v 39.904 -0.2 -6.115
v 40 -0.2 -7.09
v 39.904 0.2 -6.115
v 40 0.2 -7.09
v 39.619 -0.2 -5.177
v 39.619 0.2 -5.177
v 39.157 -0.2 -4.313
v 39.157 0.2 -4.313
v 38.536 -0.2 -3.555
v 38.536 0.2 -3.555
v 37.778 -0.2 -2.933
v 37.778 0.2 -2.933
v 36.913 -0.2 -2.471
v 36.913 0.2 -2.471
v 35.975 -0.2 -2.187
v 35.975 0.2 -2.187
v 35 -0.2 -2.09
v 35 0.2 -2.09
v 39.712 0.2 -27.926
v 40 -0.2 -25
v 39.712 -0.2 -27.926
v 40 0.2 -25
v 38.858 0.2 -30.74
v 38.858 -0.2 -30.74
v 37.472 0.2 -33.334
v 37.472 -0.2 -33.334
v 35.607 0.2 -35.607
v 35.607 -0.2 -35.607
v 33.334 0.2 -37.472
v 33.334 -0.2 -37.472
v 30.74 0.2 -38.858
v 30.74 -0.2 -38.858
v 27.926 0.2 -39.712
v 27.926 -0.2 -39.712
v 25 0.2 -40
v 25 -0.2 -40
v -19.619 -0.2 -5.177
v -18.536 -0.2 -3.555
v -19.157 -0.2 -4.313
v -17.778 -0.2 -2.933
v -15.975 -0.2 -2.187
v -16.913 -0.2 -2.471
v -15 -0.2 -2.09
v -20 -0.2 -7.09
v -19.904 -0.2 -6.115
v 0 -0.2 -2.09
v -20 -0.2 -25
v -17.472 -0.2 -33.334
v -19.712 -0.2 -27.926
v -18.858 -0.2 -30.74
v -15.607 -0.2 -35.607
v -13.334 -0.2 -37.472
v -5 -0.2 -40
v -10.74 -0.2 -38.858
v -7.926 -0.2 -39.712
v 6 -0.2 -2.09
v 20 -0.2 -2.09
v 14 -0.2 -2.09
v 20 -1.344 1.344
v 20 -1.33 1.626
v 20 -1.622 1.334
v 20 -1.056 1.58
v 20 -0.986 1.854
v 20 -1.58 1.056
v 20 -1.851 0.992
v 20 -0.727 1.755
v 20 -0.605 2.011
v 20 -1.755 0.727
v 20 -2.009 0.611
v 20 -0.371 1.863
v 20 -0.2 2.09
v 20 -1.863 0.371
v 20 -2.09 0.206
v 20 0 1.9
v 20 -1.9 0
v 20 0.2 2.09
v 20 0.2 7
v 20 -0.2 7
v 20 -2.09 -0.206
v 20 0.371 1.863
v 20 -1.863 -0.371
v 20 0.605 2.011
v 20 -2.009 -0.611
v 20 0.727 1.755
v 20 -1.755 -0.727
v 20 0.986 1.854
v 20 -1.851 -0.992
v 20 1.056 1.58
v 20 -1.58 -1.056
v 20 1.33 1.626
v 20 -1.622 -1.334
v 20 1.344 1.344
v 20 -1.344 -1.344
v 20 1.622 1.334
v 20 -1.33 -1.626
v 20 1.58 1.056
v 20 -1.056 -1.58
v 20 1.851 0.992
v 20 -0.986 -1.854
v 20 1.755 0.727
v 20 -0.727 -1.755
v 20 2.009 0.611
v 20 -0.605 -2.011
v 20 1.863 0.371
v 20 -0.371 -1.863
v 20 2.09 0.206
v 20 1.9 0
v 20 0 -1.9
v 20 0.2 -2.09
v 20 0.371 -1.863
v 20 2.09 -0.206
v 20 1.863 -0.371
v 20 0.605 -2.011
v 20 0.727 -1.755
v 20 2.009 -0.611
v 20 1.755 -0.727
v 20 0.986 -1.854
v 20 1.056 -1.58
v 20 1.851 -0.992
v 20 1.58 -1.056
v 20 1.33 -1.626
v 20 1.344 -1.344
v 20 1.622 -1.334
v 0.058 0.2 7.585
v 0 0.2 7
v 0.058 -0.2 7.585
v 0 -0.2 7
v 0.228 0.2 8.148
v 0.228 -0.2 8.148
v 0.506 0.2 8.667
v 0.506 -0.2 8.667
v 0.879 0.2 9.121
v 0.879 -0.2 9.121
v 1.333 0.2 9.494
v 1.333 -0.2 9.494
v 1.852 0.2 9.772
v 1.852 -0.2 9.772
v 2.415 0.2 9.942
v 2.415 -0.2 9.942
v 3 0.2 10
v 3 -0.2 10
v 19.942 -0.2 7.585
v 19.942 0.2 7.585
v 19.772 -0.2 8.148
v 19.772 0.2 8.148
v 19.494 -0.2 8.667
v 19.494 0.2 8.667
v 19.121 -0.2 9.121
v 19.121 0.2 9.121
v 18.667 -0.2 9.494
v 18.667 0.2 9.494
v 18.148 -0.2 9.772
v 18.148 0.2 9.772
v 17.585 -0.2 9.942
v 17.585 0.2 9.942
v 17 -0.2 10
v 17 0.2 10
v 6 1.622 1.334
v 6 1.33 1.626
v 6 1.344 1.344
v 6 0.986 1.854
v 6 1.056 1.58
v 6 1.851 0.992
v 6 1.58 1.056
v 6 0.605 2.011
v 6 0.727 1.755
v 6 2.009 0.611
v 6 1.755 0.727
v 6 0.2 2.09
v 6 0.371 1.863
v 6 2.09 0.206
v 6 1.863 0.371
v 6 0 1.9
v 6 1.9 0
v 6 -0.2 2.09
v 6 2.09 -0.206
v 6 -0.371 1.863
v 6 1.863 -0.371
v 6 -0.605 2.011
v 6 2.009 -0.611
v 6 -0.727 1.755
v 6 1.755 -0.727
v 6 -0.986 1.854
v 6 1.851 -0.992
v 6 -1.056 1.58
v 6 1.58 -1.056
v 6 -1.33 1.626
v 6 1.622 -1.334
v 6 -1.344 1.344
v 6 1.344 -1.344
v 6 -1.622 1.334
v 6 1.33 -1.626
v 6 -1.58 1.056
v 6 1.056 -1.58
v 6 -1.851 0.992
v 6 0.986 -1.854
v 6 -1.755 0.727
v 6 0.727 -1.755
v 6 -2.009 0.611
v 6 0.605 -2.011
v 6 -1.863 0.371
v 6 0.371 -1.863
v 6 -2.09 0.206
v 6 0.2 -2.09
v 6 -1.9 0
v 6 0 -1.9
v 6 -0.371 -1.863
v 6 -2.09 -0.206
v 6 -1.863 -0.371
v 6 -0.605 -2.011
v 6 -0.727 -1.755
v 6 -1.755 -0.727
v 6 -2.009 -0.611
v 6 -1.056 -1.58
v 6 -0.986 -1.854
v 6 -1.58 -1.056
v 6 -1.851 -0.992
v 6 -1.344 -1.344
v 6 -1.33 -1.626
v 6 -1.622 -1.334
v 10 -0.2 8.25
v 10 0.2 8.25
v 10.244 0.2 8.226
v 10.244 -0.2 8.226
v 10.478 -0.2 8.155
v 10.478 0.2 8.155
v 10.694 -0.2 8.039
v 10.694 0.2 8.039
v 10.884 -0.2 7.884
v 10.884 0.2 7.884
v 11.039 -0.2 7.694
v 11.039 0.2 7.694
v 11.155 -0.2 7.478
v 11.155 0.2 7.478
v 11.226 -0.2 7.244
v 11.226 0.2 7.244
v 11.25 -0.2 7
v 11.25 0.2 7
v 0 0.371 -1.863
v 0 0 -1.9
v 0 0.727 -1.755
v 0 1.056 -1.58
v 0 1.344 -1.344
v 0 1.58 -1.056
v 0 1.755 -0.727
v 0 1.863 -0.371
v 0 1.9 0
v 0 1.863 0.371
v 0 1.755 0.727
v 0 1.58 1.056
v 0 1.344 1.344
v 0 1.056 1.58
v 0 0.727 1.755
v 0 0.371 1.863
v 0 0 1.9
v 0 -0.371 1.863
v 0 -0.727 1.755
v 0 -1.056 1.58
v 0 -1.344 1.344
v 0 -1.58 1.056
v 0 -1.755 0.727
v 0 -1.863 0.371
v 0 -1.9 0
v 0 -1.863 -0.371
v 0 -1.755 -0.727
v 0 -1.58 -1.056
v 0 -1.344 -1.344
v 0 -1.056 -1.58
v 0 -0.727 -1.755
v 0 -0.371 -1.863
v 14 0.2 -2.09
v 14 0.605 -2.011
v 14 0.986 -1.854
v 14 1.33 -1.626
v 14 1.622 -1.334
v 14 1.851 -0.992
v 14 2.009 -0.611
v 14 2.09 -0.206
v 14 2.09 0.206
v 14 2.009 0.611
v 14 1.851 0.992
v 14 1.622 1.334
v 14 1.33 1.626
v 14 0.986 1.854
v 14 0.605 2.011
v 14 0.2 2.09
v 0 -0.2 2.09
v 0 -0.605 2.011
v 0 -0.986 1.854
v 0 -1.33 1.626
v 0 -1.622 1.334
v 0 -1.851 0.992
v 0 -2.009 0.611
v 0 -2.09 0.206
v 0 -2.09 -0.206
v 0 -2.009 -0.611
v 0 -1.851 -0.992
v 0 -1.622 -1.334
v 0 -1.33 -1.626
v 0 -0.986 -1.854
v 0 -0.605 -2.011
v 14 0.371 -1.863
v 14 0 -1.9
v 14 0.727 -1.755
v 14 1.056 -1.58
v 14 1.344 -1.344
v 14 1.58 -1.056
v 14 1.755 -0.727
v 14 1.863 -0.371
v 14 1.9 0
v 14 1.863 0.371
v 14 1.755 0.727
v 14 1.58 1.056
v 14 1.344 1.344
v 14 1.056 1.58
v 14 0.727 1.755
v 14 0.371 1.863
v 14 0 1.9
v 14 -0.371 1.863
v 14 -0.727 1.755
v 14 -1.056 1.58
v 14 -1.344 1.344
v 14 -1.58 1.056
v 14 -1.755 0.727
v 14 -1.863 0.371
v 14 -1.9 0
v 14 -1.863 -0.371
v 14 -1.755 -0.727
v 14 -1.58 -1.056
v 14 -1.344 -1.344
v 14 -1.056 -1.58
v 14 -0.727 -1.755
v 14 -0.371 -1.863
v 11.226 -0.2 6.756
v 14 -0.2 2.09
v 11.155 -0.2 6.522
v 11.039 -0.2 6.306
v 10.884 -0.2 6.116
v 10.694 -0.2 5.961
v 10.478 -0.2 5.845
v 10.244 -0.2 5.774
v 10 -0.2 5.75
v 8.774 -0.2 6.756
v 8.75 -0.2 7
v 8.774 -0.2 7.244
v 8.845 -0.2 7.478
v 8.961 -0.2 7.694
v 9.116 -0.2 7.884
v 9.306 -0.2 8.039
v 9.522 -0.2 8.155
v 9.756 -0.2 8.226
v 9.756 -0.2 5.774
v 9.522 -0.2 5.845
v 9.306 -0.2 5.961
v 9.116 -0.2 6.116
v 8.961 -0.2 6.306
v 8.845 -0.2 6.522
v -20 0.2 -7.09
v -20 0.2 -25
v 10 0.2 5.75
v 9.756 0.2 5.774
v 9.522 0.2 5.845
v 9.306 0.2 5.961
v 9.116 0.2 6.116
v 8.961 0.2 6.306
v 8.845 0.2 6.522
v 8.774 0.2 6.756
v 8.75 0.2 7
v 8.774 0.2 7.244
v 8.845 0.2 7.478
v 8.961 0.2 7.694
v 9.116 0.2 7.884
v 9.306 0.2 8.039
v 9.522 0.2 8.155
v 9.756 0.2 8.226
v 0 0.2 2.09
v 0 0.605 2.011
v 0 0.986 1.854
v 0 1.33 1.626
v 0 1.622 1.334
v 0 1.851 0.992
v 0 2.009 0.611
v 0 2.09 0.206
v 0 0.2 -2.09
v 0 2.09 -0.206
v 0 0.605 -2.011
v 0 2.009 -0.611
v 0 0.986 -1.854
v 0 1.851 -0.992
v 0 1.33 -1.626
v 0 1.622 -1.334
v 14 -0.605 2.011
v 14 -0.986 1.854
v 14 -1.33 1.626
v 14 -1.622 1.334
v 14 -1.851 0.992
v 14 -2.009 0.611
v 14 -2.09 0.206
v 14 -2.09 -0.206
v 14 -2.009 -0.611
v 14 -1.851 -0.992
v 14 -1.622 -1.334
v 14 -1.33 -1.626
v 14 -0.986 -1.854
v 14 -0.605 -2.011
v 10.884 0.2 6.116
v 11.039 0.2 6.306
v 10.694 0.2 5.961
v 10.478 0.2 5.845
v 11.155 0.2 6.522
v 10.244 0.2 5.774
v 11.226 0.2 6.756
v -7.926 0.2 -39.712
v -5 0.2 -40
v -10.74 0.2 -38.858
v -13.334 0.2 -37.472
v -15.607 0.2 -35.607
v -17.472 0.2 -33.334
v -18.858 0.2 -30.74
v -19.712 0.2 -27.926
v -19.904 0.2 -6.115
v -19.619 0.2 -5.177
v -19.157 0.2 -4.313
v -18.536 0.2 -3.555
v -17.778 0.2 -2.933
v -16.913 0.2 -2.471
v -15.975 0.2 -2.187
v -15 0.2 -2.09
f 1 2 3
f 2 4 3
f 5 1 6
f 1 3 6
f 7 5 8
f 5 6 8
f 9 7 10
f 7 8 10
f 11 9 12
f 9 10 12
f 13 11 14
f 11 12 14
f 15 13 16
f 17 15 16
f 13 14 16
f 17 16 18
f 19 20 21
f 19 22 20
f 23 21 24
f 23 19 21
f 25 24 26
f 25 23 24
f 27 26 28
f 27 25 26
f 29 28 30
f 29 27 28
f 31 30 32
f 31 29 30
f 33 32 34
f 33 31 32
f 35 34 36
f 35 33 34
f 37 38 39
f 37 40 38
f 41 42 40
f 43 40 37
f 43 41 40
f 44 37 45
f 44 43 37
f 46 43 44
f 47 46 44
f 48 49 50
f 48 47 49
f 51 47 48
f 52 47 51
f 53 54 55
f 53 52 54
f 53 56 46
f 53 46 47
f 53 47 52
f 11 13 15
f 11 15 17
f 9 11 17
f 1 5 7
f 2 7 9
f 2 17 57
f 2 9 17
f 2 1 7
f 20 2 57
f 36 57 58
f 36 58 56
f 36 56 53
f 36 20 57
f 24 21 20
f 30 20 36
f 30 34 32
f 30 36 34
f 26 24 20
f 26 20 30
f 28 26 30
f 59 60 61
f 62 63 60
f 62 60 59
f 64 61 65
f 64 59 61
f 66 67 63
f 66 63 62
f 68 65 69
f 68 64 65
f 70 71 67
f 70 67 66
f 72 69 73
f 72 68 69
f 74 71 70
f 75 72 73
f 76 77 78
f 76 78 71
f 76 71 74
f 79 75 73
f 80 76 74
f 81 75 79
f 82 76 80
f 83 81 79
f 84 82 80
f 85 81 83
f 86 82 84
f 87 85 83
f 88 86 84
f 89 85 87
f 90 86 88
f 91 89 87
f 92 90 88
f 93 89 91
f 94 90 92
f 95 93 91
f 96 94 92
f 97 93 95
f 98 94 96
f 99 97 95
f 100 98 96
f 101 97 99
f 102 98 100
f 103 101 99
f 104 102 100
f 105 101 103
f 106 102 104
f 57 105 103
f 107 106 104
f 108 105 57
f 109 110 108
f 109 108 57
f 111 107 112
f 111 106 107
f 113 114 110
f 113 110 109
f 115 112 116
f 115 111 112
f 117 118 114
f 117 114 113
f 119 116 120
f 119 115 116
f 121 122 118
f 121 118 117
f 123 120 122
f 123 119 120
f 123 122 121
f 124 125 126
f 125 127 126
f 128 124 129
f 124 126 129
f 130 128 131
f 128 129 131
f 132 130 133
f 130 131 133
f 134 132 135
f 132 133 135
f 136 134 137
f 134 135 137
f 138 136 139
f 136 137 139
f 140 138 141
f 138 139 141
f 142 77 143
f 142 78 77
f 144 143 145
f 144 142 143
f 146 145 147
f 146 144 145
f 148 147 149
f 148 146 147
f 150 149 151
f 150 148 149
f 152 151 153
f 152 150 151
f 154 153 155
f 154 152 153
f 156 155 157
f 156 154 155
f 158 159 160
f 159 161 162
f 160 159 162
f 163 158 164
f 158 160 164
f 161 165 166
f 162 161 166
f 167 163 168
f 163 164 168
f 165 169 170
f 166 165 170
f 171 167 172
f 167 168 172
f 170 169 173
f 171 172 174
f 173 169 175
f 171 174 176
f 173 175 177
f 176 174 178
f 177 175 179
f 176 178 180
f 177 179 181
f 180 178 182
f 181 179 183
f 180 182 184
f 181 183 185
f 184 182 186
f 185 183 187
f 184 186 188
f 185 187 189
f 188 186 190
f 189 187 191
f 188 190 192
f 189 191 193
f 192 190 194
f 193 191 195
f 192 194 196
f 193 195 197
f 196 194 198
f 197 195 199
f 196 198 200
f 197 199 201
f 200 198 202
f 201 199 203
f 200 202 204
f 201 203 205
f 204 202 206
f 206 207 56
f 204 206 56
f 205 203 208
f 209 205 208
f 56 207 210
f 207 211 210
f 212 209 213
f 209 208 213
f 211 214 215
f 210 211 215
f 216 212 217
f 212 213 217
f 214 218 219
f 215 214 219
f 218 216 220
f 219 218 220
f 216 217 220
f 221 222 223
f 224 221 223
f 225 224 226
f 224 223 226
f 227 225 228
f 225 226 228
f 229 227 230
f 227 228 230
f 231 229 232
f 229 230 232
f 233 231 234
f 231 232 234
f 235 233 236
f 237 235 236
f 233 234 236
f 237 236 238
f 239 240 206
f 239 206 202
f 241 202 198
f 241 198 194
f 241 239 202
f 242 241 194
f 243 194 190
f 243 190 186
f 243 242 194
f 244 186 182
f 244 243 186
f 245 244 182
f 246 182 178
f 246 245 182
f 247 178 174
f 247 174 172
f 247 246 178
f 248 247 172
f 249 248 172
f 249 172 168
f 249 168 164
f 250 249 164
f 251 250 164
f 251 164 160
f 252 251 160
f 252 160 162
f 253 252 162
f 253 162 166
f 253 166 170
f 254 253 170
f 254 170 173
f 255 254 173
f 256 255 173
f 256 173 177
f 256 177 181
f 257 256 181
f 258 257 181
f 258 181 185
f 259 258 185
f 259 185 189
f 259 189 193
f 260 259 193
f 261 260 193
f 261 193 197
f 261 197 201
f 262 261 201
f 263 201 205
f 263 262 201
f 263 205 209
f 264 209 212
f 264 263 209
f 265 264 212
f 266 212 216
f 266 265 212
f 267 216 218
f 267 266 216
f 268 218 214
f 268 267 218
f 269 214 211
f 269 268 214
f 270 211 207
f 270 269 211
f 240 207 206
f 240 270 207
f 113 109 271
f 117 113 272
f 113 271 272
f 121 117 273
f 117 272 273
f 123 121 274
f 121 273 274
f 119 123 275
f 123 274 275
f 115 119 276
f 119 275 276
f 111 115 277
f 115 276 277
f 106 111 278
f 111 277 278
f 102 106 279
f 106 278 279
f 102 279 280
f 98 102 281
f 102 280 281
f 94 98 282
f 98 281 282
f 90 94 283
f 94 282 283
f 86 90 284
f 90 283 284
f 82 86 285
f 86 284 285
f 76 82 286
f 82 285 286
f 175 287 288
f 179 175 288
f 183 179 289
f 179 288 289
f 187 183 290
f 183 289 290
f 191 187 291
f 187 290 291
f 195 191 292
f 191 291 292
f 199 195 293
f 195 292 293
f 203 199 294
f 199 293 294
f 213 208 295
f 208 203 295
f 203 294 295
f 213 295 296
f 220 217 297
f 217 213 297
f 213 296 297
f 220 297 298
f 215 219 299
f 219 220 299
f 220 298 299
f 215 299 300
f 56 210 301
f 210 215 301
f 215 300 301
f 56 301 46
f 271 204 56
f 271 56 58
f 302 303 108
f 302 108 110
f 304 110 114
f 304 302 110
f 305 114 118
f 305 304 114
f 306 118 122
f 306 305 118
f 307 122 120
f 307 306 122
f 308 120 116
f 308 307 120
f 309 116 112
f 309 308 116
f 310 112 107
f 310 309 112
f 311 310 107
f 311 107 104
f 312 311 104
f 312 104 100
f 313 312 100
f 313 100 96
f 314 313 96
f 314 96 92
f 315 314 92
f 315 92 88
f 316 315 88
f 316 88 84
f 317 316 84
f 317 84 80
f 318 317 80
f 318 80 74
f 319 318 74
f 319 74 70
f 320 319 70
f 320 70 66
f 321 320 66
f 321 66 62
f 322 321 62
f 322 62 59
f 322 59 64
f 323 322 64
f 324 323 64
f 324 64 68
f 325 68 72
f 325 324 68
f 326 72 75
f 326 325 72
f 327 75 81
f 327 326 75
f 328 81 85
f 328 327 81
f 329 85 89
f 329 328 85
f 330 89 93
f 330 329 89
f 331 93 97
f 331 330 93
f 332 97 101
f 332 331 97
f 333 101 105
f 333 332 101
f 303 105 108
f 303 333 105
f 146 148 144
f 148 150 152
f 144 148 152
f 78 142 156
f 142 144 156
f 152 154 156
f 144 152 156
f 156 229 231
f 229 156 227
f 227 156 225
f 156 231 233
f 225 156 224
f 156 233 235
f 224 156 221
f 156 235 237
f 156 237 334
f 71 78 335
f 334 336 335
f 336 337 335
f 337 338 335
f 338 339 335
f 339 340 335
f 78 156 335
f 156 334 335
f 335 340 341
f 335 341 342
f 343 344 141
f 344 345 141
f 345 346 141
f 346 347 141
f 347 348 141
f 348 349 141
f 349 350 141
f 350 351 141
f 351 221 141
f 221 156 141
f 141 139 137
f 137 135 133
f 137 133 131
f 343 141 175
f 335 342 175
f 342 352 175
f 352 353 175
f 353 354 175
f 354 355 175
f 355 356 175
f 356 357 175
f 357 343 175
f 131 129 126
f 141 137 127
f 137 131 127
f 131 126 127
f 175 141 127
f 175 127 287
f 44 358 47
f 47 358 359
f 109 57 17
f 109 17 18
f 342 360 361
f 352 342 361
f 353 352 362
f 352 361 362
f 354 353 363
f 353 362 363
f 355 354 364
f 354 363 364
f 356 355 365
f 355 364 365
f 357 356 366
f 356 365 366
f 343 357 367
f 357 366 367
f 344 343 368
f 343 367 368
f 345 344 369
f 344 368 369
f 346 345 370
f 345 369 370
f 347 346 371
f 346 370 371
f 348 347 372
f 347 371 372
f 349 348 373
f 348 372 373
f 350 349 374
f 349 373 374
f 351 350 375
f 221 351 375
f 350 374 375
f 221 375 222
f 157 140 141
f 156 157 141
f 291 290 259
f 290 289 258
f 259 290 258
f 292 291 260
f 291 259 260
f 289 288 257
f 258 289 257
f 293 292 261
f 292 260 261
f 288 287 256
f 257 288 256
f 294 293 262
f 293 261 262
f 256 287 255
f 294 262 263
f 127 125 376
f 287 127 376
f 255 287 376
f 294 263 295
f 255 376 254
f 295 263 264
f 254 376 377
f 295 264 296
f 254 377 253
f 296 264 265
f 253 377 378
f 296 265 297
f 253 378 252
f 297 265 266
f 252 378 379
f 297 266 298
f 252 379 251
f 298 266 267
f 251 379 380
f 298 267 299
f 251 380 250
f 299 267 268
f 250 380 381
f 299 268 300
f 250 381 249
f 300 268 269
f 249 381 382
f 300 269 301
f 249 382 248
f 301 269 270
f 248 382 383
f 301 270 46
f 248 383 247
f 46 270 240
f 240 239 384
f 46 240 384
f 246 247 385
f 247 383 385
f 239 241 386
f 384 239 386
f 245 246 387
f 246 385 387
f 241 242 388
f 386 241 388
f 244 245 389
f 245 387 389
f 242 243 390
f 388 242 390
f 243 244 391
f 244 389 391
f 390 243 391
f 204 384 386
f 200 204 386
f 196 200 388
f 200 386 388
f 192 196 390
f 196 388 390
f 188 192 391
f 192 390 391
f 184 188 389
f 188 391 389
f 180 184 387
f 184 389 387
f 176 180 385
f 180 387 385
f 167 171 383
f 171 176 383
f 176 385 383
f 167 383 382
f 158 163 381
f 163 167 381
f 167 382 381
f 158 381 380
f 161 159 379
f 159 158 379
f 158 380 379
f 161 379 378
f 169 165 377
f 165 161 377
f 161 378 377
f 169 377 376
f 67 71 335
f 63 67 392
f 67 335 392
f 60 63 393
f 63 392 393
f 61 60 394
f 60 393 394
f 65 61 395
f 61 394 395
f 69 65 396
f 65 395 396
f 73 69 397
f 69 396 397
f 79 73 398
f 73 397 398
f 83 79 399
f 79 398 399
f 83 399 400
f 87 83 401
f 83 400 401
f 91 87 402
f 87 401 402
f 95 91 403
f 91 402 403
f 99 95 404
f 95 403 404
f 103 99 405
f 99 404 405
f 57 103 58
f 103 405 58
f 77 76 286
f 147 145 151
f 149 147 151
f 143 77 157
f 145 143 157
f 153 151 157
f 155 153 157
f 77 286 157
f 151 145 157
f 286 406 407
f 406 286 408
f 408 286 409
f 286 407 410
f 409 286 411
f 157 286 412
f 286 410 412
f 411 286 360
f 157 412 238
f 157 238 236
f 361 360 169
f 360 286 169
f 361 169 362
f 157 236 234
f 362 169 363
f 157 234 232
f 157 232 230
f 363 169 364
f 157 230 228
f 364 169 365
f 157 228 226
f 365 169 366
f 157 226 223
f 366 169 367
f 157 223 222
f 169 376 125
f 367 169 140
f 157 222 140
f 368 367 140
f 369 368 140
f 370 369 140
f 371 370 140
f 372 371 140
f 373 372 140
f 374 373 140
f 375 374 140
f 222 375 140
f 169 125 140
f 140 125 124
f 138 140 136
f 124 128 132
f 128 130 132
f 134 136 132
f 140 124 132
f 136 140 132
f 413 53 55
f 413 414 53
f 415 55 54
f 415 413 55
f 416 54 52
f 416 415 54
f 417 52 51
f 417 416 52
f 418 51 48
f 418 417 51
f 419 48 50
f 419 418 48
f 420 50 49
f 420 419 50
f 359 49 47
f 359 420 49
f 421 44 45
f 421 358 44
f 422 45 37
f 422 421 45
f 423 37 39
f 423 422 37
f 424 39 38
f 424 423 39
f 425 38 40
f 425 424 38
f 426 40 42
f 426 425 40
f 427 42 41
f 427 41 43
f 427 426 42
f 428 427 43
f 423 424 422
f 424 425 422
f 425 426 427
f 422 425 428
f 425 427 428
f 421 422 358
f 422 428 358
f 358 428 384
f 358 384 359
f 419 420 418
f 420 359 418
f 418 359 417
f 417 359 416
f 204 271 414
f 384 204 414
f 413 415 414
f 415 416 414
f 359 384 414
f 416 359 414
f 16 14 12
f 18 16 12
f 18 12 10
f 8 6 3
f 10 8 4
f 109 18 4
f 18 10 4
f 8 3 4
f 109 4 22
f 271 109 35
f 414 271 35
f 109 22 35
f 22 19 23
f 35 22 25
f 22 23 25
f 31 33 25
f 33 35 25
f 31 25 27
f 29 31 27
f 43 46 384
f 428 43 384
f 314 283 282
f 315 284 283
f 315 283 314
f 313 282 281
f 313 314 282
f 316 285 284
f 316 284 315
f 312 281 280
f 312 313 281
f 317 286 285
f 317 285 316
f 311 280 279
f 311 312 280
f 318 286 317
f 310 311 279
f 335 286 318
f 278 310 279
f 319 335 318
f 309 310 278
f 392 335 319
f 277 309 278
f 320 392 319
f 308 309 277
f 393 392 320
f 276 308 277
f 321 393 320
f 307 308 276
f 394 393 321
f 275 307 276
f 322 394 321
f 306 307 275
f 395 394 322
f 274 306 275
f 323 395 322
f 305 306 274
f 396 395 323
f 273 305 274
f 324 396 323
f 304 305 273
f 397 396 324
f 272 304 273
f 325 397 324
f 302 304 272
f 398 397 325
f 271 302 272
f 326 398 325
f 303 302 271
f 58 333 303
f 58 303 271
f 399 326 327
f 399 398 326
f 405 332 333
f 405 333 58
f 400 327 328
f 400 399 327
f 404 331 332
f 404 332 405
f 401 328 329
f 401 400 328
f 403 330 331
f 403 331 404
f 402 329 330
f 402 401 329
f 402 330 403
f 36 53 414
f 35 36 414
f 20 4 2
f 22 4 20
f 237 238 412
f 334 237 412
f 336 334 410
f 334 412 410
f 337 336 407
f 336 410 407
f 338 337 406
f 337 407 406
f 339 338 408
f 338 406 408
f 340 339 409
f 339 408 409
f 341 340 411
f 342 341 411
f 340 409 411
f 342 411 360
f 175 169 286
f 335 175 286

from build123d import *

# Parameters (mm, degrees)
SKETCH_1_R               = 1.9
EXTRUDE_1_DEPTH          = 20
SKETCH_2_W               = 37.909545504
SKETCH_2_H               = 0.4
EXTRUDE_2_DEPTH          = 20
EXTRUDE_2_DEPTH_BACK     = 40
FILLET_1_R               = 15
FILLET_2_R               = 5
FILLET_3_R               = 3
CUT_EXTRUDE_1_DEPTH      = 20
SKETCH_4_W               = 8
SKETCH_4_H               = 4.180908992
CUT_EXTRUDE_2_DEPTH      = 2.9
CUT_EXTRUDE_2_DEPTH_BACK = 3.3


with BuildPart() as part:
    # 草图1 → 凸台-拉伸1 (new body)
    with BuildSketch(Plane(origin=(0, 0, 0), x_dir=(0, 0, -1), z_dir=(1, 0, 0))):
        with BuildLine():
            Line((-10, -0.2), (-2.090454496, -0.2))
            ThreePointArc((-2.090454496, -0.2), (0, -2.1), (2.090454496, -0.2))
            Line((2.090454496, -0.2), (40, -0.2))
            Line((40, -0.2), (40, 0.2))
            Line((40, 0.2), (2.090454496, 0.2))
            ThreePointArc((2.090454496, 0.2), (0, 2.1), (-2.090454496, 0.2))
            Line((-2.090454496, 0.2), (-10, 0.2))
            Line((-10, 0.2), (-10, -0.2))
        make_face()
        Circle(SKETCH_1_R, mode=Mode.SUBTRACT)
    extrude(amount=EXTRUDE_1_DEPTH)

    # 草图2 → 凸台-拉伸2 (add, two sides)
    with BuildSketch(Plane(origin=(20, 0, 0), x_dir=(0, 0, -1), z_dir=(1, 0, 0))) as extrude_2_sk:
        with Locations((21.045227248, 0)):
            Rectangle(SKETCH_2_W, SKETCH_2_H)
    extrude(amount=EXTRUDE_2_DEPTH)
    extrude(extrude_2_sk.sketch, amount=-EXTRUDE_2_DEPTH_BACK)

    # 圆角1
    fillet_1_edges = [part.edges().sort_by_distance(p)[0] for p in [
        (-20, 0, -40),
        (40, 0, -40),
    ]]
    fillet(fillet_1_edges, radius=FILLET_1_R)

    # 圆角2
    fillet_2_edges = [part.edges().sort_by_distance(p)[0] for p in [
        (-20, 0, -2.090454496),
        (40, 0, -2.090454496),
    ]]
    fillet(fillet_2_edges, radius=FILLET_2_R)

    # 圆角3
    fillet_3_edges = [part.edges().sort_by_distance(p)[0] for p in [
        (0, 0, 10),
        (20, 0, 10),
    ]]
    fillet(fillet_3_edges, radius=FILLET_3_R)

    # 草图3 → 切除-拉伸1 (cut)
    with BuildSketch(Plane(origin=(0, 0.2, 0), x_dir=(1, 0, 0), z_dir=(0, 1, 0))):
        with BuildLine():
            ThreePointArc((11.25, -7), (10.883883476, -6.116116524), (10, -5.75))
            Line((10, -5.75), (10, -8.25))
            ThreePointArc((10, -8.25), (10.883883476, -7.883883476), (11.25, -7))
        make_face()
        with BuildLine():
            Line((10, -8.25), (10, -5.75))
            ThreePointArc((10, -5.75), (8.75, -7), (10, -8.25))
        make_face()
    extrude(amount=-CUT_EXTRUDE_1_DEPTH, mode=Mode.SUBTRACT)

    # 草图4 → 切除-拉伸2 (cut, two sides)
    with BuildSketch(Plane(origin=(0, 0.2, 0), x_dir=(1, 0, 0), z_dir=(0, 1, 0))) as cut_extrude_2_sk:
        with Locations((10, 0)):
            Rectangle(SKETCH_4_W, SKETCH_4_H)
    extrude(amount=CUT_EXTRUDE_2_DEPTH, mode=Mode.SUBTRACT)
    extrude(cut_extrude_2_sk.sketch, amount=-CUT_EXTRUDE_2_DEPTH_BACK, mode=Mode.SUBTRACT)


solid = part.part
